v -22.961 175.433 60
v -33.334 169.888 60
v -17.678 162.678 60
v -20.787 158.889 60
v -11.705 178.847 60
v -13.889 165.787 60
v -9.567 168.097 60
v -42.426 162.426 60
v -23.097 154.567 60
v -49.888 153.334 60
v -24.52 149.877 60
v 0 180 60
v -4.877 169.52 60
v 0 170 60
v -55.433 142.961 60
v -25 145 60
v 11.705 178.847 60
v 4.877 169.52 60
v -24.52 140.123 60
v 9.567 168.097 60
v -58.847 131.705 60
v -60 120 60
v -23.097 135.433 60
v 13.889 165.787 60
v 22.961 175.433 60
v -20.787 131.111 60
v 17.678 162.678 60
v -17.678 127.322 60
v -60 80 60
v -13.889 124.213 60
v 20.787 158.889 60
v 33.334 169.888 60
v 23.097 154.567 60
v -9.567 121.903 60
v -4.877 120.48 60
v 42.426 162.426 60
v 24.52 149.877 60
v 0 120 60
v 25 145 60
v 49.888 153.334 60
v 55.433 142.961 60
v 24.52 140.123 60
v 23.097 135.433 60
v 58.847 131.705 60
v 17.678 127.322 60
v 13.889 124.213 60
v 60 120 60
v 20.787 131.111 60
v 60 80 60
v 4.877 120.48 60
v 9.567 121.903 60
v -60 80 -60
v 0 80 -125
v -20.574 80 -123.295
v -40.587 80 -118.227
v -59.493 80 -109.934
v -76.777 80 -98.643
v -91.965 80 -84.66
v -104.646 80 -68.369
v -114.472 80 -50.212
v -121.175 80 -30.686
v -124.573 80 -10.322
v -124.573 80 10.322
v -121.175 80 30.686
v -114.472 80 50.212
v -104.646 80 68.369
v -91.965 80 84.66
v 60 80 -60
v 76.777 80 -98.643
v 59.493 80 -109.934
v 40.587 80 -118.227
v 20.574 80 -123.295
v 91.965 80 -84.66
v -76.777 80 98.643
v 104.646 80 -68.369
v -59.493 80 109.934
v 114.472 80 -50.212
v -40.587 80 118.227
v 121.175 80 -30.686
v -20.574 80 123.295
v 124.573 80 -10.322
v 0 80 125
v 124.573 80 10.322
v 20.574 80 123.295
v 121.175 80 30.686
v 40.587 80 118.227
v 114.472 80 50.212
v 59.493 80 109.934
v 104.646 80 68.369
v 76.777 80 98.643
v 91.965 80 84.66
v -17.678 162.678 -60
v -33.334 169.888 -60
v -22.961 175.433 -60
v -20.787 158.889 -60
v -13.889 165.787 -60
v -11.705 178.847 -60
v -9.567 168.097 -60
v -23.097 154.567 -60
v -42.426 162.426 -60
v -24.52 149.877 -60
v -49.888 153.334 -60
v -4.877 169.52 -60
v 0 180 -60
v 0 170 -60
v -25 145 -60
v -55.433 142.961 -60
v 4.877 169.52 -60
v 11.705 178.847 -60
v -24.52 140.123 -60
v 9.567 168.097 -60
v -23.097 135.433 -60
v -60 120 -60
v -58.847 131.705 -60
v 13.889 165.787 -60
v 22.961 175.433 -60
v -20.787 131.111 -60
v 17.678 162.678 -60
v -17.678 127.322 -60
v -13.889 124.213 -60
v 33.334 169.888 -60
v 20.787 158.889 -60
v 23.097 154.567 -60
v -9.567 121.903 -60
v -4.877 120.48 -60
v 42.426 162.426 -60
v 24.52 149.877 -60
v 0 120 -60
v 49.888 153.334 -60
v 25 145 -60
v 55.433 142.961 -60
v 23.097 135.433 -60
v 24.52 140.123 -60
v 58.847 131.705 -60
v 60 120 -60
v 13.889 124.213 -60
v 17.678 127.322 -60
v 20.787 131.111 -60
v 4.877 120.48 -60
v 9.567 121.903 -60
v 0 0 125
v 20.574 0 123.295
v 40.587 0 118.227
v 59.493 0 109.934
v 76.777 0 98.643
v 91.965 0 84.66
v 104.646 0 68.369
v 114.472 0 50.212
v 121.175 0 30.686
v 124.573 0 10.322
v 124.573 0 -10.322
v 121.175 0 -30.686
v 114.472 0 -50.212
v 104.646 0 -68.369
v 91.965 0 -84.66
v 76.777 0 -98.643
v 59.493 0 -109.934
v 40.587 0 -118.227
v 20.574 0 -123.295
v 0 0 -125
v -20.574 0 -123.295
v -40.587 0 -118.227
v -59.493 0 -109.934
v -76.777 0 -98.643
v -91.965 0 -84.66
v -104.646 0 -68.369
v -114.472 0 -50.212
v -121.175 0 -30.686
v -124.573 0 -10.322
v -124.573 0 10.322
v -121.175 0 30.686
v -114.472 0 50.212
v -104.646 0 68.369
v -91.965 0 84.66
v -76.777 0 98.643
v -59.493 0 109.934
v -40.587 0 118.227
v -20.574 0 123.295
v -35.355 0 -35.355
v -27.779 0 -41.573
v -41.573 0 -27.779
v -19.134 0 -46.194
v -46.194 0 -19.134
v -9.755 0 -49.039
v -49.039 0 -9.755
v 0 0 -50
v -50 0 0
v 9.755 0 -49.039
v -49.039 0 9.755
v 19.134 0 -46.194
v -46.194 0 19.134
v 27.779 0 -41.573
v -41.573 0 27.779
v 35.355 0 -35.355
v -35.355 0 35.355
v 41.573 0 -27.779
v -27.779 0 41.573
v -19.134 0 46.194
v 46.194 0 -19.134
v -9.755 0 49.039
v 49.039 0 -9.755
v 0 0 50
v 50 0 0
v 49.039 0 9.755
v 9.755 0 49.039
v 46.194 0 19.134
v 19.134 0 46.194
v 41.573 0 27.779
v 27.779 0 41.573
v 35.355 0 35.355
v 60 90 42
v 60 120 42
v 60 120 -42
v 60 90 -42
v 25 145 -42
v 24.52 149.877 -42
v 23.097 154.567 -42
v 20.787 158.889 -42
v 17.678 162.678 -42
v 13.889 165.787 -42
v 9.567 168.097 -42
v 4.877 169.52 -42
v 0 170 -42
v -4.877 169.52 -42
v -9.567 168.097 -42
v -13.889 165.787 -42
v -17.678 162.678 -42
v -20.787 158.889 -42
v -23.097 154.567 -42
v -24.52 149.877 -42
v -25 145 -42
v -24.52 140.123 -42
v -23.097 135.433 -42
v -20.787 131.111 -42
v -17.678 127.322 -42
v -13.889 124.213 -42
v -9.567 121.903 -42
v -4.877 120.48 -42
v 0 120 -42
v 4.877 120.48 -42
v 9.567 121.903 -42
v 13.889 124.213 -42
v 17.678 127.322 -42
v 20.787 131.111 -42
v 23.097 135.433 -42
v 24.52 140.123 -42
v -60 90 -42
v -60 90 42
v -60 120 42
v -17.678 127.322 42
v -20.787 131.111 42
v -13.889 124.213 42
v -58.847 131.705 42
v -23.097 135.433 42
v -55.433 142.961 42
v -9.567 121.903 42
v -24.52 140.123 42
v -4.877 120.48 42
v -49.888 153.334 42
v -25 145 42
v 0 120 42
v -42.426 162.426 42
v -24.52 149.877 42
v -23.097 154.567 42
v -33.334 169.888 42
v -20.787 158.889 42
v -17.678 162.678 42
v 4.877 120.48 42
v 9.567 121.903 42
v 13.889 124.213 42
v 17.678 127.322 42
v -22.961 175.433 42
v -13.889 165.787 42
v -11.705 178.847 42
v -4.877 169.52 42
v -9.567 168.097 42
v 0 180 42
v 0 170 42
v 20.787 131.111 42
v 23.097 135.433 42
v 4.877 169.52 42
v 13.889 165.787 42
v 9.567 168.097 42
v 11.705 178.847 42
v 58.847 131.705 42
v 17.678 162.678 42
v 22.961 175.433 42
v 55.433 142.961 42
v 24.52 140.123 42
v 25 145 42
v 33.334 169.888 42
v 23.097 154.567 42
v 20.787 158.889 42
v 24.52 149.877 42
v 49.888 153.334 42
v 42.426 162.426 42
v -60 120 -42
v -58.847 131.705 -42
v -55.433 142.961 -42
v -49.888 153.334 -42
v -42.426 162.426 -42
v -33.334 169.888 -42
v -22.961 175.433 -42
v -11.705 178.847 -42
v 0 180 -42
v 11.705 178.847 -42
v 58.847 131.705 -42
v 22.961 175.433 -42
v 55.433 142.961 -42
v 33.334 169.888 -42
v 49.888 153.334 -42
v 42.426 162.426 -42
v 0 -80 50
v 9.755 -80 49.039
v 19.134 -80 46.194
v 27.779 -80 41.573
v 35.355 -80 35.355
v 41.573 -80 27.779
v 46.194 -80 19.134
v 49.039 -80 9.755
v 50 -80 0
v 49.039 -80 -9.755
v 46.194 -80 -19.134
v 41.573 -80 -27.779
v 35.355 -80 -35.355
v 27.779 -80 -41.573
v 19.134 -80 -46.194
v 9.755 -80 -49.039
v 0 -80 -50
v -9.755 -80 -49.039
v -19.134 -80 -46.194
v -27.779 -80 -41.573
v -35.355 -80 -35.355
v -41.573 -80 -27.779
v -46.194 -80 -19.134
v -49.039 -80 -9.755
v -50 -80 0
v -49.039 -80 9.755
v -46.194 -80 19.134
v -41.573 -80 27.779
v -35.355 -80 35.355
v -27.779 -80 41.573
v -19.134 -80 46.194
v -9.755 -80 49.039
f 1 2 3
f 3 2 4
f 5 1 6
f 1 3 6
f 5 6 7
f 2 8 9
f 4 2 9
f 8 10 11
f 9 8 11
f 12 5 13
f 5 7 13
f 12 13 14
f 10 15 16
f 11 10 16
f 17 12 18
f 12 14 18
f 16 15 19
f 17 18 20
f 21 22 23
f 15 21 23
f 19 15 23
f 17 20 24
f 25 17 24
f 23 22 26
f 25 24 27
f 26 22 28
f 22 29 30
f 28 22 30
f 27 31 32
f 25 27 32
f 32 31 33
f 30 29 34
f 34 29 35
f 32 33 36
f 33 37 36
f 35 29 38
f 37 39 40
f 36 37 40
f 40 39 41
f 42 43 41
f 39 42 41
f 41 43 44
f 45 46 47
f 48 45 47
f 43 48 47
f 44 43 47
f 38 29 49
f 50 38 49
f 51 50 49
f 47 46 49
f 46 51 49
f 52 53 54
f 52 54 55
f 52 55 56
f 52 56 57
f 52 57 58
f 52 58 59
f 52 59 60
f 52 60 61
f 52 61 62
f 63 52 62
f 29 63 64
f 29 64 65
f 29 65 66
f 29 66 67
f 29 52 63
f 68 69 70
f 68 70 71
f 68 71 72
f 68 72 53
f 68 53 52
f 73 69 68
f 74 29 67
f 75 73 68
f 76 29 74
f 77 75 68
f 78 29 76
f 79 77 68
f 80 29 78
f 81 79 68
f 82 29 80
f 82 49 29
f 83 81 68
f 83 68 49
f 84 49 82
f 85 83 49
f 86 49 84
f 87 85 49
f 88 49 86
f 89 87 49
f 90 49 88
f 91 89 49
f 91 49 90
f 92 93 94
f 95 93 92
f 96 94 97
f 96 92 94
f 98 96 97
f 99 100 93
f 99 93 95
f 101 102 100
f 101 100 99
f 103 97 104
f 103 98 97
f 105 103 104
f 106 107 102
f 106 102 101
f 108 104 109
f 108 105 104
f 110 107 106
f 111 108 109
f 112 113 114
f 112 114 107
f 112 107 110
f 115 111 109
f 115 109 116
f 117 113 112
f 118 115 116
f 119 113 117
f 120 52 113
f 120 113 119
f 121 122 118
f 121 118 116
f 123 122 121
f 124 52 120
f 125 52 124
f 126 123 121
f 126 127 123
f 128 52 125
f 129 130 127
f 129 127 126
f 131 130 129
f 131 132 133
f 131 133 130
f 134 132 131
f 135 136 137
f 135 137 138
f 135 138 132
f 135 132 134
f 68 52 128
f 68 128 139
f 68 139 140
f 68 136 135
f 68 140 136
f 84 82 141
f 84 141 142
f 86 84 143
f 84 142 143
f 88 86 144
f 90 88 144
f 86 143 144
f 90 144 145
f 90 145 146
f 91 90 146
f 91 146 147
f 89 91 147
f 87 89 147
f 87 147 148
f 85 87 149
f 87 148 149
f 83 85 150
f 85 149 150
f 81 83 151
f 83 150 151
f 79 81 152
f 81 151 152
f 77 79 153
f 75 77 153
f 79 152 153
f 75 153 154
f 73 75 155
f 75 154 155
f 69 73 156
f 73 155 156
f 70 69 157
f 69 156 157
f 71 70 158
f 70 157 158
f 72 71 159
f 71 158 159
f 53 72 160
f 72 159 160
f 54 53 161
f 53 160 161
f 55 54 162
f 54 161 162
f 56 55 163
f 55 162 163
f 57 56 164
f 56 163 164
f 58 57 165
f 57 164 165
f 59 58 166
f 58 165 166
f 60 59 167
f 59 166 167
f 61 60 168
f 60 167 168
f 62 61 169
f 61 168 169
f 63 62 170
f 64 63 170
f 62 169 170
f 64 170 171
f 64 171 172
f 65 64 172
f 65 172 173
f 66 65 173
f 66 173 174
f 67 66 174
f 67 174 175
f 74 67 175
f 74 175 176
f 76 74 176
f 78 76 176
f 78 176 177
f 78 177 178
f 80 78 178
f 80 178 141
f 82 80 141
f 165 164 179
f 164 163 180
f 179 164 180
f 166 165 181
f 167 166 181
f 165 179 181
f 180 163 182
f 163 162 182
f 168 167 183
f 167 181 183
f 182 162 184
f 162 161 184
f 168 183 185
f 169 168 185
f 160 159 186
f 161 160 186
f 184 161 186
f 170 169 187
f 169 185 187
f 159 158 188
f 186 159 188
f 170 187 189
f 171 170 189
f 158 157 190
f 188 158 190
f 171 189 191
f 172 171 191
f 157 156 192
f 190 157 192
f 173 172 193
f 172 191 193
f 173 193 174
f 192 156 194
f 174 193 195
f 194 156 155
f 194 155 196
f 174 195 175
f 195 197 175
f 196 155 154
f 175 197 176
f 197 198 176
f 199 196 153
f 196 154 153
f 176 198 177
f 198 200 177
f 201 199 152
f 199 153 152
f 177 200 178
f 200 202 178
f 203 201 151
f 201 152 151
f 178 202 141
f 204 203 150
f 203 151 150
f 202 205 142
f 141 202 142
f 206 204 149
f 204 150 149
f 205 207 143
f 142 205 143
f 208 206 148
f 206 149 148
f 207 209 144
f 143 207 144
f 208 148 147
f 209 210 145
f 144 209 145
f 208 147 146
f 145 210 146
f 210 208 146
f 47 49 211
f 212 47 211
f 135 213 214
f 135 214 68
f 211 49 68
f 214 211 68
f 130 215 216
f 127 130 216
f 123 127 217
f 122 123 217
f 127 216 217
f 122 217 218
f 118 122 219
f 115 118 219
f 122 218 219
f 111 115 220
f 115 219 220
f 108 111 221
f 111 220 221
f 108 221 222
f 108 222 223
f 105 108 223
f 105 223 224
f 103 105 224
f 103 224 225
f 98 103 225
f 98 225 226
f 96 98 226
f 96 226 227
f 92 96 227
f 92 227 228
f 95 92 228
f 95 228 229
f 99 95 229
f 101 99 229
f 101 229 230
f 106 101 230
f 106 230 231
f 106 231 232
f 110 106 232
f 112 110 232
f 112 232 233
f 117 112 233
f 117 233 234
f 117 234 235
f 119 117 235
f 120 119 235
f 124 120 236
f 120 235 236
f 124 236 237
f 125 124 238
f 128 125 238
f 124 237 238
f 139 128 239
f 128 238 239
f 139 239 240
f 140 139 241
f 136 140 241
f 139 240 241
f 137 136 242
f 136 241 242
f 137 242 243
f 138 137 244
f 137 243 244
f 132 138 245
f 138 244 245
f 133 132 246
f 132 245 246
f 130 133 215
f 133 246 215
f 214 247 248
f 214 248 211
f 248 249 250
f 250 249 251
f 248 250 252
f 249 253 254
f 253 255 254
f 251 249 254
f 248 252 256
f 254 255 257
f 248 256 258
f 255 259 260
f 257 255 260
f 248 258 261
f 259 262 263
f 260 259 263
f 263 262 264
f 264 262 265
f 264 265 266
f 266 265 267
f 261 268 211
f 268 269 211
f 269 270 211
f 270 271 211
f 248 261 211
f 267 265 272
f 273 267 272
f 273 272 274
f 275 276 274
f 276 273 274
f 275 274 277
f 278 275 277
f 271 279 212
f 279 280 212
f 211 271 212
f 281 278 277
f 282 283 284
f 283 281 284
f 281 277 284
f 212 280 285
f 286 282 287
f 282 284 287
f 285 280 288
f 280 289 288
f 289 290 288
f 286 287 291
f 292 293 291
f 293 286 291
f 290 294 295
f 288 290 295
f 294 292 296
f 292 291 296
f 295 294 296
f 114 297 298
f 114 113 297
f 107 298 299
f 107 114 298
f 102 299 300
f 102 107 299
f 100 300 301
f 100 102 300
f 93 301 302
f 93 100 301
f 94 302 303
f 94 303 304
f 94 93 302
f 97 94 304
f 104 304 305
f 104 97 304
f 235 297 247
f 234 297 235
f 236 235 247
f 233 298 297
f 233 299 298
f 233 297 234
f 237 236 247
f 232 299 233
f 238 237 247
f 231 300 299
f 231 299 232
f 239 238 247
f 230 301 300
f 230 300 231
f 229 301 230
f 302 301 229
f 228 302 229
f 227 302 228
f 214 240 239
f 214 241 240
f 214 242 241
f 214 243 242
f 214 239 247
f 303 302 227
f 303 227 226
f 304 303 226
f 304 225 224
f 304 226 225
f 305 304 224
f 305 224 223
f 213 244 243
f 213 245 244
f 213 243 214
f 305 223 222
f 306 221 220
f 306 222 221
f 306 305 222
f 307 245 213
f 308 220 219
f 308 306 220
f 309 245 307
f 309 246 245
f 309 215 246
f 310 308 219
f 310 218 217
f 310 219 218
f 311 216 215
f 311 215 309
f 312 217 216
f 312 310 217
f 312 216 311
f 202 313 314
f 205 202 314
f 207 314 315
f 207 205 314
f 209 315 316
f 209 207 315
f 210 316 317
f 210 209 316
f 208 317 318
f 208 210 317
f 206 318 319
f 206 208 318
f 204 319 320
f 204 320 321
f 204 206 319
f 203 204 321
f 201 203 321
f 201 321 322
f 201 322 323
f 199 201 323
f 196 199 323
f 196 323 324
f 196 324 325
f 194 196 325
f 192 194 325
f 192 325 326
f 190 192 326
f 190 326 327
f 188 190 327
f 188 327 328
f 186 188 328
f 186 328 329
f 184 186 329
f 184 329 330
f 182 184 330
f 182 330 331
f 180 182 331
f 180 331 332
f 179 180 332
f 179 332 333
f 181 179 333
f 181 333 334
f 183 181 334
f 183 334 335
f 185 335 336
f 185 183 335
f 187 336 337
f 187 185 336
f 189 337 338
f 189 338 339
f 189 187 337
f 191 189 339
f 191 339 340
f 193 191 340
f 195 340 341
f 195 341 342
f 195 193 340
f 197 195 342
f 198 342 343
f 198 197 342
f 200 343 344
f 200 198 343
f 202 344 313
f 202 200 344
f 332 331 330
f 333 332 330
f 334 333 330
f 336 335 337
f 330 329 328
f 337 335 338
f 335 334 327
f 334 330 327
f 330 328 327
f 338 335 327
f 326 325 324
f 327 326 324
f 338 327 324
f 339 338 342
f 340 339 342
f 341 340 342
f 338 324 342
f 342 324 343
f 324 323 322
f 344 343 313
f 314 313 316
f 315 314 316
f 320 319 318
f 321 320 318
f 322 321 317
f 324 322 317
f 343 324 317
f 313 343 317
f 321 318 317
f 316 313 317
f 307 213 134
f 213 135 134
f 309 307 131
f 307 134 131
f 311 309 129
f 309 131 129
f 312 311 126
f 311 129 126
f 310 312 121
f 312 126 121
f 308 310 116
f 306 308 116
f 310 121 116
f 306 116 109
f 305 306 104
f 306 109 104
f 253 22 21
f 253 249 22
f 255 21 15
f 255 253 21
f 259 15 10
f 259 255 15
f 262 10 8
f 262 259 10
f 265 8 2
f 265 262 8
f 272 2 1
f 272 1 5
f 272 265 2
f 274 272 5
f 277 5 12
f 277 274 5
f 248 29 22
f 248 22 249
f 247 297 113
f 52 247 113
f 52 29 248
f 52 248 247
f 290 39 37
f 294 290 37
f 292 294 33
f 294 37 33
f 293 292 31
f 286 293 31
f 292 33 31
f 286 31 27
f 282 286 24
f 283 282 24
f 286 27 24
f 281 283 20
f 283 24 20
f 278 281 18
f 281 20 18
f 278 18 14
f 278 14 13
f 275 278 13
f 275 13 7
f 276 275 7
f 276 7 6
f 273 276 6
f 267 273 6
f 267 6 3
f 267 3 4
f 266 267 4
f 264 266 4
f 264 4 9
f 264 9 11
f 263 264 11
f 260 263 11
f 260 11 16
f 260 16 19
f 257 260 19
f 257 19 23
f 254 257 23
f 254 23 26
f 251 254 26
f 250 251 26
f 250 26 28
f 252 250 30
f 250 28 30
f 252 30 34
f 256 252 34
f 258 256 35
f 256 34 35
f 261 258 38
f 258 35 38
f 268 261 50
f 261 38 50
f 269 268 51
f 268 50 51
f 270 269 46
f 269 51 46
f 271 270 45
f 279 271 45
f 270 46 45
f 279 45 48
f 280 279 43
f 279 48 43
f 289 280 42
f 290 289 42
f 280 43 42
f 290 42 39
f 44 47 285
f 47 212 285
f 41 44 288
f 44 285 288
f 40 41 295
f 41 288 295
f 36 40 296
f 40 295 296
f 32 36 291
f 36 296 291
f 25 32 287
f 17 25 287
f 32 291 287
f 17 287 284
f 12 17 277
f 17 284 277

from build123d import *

# Parameters (mm, degrees)
SKETCH1_R           = 125
BOSS_EXTRUDE1_DEPTH = 80
SKETCH2_R           = 50
BOSS_EXTRUDE2_DEPTH = 160
SKETCH3_W           = 120
SKETCH3_H           = 120
BOSS_EXTRUDE3_DEPTH = 100
SKETCH4_W           = 120
SKETCH4_H           = 84
CUT_EXTRUDE1_DEPTH  = 90
FILLET1_R           = 60
SKETCH5_R           = 25
CUT_EXTRUDE2_DEPTH  = 130


with BuildPart() as part:
    # Sketch1 → Boss-Extrude1 (new body)
    with BuildSketch(Plane(origin=(0, 0, 0), x_dir=(1, 0, 0), z_dir=(0, 1, 0))):
        with Locations(Location((0, 0, 0), (0, 0, 270))):
            Circle(SKETCH1_R)
    extrude(amount=BOSS_EXTRUDE1_DEPTH)

    # Sketch2 → Boss-Extrude2 (add)
    with BuildSketch(Plane(origin=(0, 80, 0), x_dir=(1, 0, 0), z_dir=(0, 1, 0))):
        with Locations(Location((0, 0, 0), (0, 0, 270))):
            Circle(SKETCH2_R)
    extrude(amount=-BOSS_EXTRUDE2_DEPTH)

    # Sketch3 → Boss-Extrude3 (add)
    with BuildSketch(Plane(origin=(0, 80, 0), x_dir=(1, 0, 0), z_dir=(0, 1, 0))):
        Rectangle(SKETCH3_W, SKETCH3_H)
    extrude(amount=BOSS_EXTRUDE3_DEPTH)

    # Sketch4 → Cut-Extrude1 (cut)
    with BuildSketch(Plane(origin=(0, 180, 0), x_dir=(1, 0, 0), z_dir=(0, 1, 0))):
        Rectangle(SKETCH4_W, SKETCH4_H)
    extrude(amount=-CUT_EXTRUDE1_DEPTH, mode=Mode.SUBTRACT)

    # Fillet1
    fillet1_edges = [part.edges().sort_by_distance(p)[0] for p in [
        (-60, 180, 51),
        (-60, 180, -51),
        (60, 180, -51),
        (60, 180, 51),
    ]]
    fillet(fillet1_edges, radius=FILLET1_R - 0.0001)  # a hair under: the kernel refuses the full size

    # Sketch5 → Cut-Extrude2 (cut)
    with BuildSketch(Plane.XY.offset(60)):
        with Locations((0, 145)):
            Circle(SKETCH5_R)
    extrude(amount=-CUT_EXTRUDE2_DEPTH, mode=Mode.SUBTRACT)


solid = part.part
